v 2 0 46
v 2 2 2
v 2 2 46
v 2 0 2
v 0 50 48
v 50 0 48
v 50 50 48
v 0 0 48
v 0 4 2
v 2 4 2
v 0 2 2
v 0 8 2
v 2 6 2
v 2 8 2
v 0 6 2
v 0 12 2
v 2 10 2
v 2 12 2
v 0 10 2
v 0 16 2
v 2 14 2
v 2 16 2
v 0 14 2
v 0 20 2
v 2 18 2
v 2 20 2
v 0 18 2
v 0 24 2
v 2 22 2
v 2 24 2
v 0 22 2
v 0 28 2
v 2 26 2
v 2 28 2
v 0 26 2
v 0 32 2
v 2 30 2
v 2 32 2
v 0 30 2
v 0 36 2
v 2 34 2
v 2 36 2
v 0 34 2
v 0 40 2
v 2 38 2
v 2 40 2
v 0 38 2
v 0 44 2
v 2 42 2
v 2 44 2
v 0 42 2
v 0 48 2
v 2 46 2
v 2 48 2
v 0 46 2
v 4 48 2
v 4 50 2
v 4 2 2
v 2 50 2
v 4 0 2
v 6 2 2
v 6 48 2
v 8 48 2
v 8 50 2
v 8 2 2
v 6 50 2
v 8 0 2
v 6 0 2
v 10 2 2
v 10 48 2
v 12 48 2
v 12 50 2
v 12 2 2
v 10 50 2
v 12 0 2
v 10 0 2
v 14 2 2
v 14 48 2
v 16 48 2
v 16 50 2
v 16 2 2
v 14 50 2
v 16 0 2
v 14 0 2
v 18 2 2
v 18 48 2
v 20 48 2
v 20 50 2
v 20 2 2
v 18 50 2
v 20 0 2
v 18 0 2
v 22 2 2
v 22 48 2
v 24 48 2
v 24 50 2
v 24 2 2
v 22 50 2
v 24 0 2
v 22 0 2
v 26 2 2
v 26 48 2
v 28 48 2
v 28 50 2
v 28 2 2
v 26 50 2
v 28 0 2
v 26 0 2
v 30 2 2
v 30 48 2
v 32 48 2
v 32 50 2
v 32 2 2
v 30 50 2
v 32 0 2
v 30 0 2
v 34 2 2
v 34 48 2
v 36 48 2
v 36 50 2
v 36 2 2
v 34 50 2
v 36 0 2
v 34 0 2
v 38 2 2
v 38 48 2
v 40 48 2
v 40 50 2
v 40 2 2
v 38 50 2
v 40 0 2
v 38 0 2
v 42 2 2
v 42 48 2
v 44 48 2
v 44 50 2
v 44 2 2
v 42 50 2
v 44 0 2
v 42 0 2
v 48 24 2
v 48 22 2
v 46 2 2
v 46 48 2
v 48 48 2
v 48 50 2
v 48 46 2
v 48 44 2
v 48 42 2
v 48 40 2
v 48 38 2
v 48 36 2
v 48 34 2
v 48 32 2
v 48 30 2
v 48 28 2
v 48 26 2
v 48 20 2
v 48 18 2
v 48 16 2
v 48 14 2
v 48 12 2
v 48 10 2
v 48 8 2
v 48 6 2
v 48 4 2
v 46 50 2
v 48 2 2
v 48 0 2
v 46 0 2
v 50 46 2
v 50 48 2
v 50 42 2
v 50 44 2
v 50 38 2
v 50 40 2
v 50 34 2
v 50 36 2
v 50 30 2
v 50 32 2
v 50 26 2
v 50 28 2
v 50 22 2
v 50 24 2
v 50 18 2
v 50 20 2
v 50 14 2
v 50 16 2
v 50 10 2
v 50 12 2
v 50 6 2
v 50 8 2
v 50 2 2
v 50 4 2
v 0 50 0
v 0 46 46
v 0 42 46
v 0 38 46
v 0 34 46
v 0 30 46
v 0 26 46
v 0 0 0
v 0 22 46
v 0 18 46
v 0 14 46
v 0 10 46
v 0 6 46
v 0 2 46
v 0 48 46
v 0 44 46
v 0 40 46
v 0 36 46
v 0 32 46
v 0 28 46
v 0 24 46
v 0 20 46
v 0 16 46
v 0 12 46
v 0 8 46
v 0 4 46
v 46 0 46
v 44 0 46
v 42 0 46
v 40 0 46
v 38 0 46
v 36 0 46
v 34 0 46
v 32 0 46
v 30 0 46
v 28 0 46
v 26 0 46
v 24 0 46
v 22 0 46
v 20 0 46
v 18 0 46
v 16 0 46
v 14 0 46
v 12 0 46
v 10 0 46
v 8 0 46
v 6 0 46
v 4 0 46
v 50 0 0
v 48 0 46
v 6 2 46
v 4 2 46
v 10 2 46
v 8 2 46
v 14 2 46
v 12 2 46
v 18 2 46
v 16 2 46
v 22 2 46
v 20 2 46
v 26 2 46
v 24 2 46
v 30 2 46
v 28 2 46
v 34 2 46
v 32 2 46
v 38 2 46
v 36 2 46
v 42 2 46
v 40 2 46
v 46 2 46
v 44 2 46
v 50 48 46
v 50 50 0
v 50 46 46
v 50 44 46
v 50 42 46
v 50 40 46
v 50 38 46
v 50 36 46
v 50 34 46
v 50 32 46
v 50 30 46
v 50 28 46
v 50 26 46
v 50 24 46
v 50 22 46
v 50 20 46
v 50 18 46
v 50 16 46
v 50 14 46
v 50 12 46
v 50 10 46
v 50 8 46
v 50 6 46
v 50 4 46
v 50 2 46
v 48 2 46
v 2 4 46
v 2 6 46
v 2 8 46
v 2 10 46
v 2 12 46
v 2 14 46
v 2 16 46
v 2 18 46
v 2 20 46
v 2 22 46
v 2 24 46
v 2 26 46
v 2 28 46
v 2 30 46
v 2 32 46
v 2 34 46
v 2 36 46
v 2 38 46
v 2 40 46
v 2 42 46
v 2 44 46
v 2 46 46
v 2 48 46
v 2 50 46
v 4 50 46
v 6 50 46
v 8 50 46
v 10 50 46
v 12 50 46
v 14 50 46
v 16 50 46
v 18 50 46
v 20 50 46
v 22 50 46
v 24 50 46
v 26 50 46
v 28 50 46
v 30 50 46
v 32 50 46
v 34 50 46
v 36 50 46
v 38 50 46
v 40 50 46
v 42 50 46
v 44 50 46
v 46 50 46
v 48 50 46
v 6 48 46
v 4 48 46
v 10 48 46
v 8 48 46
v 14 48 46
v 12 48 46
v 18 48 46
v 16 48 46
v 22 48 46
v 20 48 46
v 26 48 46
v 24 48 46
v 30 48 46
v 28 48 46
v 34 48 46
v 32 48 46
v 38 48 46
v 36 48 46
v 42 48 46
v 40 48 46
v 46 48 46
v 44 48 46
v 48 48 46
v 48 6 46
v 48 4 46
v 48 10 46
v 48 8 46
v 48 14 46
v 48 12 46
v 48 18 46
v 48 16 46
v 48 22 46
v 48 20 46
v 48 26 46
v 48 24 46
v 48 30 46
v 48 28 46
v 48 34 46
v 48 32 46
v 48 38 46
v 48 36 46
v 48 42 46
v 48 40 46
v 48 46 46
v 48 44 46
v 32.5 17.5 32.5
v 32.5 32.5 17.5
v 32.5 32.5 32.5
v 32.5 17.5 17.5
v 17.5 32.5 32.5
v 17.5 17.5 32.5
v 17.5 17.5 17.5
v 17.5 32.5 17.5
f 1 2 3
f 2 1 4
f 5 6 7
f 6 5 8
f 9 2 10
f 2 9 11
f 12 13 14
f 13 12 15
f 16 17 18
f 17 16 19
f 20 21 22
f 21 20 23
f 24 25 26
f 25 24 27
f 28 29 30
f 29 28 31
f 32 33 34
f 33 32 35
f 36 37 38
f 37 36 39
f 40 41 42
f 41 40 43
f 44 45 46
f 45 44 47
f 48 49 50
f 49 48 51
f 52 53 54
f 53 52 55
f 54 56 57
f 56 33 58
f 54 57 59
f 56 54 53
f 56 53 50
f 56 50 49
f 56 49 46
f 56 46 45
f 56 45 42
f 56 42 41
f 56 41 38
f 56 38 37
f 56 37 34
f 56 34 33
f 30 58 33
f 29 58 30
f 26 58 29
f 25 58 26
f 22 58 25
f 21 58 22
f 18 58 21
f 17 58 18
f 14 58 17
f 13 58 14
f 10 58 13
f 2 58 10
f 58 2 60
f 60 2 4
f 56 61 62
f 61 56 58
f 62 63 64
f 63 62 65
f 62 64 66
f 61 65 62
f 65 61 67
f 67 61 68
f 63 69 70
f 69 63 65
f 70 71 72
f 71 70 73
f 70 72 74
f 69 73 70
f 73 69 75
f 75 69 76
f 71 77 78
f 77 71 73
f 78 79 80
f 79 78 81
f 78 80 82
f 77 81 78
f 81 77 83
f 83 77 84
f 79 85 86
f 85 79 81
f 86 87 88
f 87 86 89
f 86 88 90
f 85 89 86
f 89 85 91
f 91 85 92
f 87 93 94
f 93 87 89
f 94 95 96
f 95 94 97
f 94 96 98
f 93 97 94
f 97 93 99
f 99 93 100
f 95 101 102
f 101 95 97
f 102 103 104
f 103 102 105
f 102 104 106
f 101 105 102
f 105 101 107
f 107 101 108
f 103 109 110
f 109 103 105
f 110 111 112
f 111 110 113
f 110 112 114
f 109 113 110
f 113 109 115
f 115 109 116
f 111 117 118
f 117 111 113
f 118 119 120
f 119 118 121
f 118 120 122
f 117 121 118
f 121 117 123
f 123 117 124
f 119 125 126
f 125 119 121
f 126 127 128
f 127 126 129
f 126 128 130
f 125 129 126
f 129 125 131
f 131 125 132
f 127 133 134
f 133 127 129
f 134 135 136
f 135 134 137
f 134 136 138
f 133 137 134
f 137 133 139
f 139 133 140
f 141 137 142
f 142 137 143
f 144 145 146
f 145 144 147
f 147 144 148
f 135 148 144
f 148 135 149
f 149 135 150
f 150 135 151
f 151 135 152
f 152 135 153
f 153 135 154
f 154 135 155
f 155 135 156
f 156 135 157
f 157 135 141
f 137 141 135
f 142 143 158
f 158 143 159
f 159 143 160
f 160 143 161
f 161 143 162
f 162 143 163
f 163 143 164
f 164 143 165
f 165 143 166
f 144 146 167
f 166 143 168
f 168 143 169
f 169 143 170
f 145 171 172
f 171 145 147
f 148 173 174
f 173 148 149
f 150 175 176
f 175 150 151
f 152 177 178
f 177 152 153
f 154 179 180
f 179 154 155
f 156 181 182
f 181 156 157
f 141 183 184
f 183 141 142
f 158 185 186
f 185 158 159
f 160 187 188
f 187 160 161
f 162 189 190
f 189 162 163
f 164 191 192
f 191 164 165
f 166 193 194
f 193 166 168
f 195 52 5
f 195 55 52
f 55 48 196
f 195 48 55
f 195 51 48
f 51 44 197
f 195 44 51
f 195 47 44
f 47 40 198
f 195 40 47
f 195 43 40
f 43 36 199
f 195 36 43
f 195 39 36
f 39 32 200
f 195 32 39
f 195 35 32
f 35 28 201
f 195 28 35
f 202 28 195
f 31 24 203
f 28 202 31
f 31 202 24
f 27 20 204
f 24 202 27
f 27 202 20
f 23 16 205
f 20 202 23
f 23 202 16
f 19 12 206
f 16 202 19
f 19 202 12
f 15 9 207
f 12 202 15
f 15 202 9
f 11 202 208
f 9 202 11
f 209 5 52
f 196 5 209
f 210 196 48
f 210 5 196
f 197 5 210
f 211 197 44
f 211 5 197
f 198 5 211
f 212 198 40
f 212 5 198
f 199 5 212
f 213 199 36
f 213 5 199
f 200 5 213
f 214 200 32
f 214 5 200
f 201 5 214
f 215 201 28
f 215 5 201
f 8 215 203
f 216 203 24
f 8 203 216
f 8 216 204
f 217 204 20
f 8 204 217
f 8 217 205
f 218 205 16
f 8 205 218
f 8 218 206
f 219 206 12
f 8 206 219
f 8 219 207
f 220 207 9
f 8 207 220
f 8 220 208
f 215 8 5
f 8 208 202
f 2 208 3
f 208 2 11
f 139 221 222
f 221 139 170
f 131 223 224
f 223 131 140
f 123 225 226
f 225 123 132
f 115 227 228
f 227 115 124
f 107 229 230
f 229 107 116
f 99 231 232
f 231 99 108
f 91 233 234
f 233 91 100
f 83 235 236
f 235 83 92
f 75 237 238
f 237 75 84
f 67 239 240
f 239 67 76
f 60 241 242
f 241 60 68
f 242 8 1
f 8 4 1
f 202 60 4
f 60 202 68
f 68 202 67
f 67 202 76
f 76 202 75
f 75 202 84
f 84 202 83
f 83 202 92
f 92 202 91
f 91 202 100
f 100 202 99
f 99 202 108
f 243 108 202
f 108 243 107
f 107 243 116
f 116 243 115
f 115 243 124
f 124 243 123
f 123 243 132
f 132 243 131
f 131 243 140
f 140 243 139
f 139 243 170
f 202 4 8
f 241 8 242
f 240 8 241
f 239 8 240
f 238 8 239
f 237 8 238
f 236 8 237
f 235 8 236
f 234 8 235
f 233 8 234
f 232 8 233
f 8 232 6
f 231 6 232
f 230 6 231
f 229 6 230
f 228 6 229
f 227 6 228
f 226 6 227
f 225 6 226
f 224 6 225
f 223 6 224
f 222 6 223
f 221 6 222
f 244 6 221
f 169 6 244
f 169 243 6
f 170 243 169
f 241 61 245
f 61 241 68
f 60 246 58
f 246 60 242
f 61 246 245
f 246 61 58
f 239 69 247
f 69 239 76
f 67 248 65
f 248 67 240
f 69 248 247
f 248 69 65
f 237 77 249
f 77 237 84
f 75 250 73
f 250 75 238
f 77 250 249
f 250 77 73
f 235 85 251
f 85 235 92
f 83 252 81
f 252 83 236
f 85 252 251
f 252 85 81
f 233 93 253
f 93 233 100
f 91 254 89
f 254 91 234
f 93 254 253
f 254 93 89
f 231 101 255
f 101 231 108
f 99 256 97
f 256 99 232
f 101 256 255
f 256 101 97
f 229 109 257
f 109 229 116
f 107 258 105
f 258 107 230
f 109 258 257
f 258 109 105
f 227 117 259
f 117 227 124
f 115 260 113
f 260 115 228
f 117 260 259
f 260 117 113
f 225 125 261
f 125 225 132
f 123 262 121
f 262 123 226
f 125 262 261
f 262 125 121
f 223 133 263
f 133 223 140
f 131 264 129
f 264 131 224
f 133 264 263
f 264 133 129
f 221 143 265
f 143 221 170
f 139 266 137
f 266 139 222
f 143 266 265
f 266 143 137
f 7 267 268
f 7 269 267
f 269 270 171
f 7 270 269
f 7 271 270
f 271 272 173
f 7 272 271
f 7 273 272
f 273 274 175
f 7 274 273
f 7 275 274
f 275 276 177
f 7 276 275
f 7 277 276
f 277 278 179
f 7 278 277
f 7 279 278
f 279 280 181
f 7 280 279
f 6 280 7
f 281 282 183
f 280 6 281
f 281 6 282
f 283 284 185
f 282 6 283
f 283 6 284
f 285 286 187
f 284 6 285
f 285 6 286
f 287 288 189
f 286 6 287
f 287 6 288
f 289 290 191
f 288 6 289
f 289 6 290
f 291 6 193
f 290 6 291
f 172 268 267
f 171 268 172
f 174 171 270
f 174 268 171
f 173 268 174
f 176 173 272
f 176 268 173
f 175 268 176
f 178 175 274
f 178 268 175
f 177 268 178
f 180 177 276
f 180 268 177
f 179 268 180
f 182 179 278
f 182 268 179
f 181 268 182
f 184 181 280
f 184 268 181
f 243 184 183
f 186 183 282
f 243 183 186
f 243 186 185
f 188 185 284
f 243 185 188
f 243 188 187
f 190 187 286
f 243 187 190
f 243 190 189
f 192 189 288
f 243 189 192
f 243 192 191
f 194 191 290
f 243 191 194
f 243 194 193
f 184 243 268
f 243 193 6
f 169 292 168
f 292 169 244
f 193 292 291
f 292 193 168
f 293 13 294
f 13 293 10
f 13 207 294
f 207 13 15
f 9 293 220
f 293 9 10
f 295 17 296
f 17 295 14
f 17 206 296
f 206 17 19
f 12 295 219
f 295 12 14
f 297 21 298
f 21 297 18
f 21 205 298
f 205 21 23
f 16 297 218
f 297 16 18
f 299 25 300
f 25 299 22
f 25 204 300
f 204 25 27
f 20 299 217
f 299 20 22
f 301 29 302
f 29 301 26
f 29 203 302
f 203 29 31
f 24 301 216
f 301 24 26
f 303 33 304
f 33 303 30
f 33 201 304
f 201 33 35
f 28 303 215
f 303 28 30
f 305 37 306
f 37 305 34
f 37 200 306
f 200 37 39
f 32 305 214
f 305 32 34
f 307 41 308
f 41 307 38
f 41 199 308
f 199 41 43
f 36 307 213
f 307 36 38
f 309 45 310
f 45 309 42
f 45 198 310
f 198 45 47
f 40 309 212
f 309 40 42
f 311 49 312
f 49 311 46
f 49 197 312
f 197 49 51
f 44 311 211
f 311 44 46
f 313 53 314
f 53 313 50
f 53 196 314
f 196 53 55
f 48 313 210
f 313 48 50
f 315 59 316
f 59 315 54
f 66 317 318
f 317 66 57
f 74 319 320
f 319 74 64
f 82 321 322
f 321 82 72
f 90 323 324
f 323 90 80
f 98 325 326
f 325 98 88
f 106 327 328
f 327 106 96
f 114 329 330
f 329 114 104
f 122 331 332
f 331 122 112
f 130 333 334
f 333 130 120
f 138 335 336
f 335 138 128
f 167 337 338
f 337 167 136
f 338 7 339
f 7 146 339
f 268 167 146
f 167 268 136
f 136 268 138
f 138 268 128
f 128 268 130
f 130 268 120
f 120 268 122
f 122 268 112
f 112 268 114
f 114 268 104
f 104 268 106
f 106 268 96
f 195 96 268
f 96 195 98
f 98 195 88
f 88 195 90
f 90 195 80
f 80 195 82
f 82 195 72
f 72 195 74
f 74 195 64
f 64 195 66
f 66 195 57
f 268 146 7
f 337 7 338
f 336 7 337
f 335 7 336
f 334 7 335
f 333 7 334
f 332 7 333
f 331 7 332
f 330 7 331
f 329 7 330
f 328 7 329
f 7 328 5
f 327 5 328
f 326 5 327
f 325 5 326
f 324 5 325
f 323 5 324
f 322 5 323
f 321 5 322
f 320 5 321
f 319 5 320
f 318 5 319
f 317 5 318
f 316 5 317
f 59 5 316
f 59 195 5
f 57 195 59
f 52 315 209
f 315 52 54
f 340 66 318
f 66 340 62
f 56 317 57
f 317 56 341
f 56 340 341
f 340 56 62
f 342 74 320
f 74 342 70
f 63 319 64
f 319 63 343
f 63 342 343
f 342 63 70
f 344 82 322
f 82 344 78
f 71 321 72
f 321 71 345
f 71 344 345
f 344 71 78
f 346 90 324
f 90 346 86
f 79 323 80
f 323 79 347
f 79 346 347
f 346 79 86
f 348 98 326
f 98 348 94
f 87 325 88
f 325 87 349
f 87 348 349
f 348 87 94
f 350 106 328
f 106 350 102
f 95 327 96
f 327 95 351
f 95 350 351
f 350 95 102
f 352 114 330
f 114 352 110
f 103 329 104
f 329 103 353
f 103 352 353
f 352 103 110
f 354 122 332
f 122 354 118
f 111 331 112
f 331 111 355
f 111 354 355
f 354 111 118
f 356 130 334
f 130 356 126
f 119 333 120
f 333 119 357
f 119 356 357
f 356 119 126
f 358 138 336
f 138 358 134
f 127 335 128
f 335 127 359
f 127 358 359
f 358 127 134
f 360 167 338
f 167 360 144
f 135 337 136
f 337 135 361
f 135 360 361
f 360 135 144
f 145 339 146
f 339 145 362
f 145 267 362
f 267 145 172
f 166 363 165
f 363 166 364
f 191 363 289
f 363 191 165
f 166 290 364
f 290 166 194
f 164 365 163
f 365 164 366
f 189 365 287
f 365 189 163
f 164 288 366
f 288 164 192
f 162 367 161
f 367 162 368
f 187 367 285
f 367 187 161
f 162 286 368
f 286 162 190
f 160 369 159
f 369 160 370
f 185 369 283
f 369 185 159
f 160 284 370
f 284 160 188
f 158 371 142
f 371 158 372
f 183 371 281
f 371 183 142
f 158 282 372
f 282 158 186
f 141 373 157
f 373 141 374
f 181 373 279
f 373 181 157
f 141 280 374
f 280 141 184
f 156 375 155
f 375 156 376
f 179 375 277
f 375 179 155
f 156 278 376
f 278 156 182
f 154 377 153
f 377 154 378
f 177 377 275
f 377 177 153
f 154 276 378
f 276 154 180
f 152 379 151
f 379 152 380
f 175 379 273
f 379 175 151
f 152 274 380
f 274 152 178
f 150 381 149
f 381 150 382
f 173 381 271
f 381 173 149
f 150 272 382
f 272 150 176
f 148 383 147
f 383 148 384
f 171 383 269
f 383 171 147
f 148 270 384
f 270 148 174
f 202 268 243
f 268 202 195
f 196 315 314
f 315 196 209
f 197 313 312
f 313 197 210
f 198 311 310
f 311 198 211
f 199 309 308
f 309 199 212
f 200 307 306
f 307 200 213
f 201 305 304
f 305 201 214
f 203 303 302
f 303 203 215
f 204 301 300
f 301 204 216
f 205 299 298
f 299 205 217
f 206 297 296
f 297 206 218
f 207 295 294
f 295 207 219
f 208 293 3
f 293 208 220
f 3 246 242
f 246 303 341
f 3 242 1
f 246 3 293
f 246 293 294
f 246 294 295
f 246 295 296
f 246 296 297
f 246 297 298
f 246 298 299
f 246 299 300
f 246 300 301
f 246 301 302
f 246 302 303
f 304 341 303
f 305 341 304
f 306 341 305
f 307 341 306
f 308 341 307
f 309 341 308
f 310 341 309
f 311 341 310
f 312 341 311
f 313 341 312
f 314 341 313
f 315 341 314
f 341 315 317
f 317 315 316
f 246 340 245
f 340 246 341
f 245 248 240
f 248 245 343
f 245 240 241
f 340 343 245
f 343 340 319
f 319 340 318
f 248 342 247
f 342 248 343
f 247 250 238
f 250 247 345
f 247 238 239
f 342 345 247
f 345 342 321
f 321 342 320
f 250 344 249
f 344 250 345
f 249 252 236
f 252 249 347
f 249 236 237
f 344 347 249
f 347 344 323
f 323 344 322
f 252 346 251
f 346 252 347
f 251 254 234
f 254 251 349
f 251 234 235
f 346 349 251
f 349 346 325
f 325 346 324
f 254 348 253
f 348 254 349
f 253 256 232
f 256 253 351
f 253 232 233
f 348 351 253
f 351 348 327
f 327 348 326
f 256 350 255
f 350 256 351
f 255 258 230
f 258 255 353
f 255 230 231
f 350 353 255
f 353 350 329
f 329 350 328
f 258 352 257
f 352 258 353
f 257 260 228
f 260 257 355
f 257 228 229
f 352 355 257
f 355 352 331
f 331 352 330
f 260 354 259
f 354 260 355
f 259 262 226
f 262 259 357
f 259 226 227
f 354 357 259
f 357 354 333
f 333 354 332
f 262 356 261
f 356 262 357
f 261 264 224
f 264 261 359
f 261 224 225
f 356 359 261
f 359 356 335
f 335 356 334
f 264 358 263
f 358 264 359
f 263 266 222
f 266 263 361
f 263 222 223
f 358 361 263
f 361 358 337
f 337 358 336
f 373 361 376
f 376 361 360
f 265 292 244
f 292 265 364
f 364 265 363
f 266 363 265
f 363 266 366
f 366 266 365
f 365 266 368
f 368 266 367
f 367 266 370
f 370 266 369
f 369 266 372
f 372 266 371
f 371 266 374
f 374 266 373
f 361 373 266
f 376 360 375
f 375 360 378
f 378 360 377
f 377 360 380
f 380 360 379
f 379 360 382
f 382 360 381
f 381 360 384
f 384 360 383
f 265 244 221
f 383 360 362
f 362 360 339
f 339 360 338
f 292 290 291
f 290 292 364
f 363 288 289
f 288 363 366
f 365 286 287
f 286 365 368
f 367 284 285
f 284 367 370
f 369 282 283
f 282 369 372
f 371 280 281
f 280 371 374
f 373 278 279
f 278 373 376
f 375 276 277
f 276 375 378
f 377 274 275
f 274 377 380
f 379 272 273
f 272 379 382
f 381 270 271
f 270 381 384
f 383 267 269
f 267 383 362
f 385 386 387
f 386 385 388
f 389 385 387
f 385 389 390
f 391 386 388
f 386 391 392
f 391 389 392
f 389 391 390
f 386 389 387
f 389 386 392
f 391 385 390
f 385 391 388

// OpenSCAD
sideLengthCube = 15;
sideLengthCage = 50;
wallThicknessCube = 2;
wallThicknessCage = 2;

module cage() {

  cageFrame();
  // cagePillar();

  translate([0, 0, wallThicknessCage]) {

    for (i=[0:4]) {

      for (j=[0:(sideLengthCage/wallThicknessCage)-1]) {

        if (i == 0) {
          if (j%2 == 0) {
            translate([j*wallThicknessCage, 0, 0])
              cagePillar();
          }
        } else if (i == 1) {
          if (j%2 == 0) {
            translate([0, j*wallThicknessCage, 0])
              cagePillar();
          }
        } else if (i == 2) {
          if (j%2 == 0) {
            translate([j*wallThicknessCage, sideLengthCage - wallThicknessCage, 0])
              cagePillar();
          }
        } else {
          if (j%2 == 0) {
            translate([sideLengthCage - wallThicknessCage, j*wallThicknessCage, 0])
              cagePillar();
          }
        }
        
      }
      
    }

  }
  
  // translate([2*wallThicknessCage, 0, wallThicknessCage])
  //   cagePillar();
  translate([0, 0, sideLengthCage - 2*wallThicknessCage])
    cageFrame();
  
}

module cageFrame() {

  cube([sideLengthCage, sideLengthCage, wallThicknessCage]);
  // difference() {
  //   cube([sideLengthCage, sideLengthCage, wallThicknessCage]);
  //   translate([wallThicknessCage, wallThicknessCage, 0])
  //     cube([sideLengthCage - 2*wallThicknessCage, sideLengthCage - 2*wallThicknessCage, wallThicknessCage]);
  // }
  
}

module cagePillar() {

  cube([wallThicknessCage, wallThicknessCage, sideLengthCage - 2*wallThicknessCage]);
  
}

module innerCube() {

  translate([sideLengthCage/2 - sideLengthCube/2, sideLengthCage/2 - sideLengthCube/2, sideLengthCage/2 - sideLengthCube/2])
    cube([sideLengthCube, sideLengthCube, sideLengthCube]);
  
}

cage();
innerCube();
